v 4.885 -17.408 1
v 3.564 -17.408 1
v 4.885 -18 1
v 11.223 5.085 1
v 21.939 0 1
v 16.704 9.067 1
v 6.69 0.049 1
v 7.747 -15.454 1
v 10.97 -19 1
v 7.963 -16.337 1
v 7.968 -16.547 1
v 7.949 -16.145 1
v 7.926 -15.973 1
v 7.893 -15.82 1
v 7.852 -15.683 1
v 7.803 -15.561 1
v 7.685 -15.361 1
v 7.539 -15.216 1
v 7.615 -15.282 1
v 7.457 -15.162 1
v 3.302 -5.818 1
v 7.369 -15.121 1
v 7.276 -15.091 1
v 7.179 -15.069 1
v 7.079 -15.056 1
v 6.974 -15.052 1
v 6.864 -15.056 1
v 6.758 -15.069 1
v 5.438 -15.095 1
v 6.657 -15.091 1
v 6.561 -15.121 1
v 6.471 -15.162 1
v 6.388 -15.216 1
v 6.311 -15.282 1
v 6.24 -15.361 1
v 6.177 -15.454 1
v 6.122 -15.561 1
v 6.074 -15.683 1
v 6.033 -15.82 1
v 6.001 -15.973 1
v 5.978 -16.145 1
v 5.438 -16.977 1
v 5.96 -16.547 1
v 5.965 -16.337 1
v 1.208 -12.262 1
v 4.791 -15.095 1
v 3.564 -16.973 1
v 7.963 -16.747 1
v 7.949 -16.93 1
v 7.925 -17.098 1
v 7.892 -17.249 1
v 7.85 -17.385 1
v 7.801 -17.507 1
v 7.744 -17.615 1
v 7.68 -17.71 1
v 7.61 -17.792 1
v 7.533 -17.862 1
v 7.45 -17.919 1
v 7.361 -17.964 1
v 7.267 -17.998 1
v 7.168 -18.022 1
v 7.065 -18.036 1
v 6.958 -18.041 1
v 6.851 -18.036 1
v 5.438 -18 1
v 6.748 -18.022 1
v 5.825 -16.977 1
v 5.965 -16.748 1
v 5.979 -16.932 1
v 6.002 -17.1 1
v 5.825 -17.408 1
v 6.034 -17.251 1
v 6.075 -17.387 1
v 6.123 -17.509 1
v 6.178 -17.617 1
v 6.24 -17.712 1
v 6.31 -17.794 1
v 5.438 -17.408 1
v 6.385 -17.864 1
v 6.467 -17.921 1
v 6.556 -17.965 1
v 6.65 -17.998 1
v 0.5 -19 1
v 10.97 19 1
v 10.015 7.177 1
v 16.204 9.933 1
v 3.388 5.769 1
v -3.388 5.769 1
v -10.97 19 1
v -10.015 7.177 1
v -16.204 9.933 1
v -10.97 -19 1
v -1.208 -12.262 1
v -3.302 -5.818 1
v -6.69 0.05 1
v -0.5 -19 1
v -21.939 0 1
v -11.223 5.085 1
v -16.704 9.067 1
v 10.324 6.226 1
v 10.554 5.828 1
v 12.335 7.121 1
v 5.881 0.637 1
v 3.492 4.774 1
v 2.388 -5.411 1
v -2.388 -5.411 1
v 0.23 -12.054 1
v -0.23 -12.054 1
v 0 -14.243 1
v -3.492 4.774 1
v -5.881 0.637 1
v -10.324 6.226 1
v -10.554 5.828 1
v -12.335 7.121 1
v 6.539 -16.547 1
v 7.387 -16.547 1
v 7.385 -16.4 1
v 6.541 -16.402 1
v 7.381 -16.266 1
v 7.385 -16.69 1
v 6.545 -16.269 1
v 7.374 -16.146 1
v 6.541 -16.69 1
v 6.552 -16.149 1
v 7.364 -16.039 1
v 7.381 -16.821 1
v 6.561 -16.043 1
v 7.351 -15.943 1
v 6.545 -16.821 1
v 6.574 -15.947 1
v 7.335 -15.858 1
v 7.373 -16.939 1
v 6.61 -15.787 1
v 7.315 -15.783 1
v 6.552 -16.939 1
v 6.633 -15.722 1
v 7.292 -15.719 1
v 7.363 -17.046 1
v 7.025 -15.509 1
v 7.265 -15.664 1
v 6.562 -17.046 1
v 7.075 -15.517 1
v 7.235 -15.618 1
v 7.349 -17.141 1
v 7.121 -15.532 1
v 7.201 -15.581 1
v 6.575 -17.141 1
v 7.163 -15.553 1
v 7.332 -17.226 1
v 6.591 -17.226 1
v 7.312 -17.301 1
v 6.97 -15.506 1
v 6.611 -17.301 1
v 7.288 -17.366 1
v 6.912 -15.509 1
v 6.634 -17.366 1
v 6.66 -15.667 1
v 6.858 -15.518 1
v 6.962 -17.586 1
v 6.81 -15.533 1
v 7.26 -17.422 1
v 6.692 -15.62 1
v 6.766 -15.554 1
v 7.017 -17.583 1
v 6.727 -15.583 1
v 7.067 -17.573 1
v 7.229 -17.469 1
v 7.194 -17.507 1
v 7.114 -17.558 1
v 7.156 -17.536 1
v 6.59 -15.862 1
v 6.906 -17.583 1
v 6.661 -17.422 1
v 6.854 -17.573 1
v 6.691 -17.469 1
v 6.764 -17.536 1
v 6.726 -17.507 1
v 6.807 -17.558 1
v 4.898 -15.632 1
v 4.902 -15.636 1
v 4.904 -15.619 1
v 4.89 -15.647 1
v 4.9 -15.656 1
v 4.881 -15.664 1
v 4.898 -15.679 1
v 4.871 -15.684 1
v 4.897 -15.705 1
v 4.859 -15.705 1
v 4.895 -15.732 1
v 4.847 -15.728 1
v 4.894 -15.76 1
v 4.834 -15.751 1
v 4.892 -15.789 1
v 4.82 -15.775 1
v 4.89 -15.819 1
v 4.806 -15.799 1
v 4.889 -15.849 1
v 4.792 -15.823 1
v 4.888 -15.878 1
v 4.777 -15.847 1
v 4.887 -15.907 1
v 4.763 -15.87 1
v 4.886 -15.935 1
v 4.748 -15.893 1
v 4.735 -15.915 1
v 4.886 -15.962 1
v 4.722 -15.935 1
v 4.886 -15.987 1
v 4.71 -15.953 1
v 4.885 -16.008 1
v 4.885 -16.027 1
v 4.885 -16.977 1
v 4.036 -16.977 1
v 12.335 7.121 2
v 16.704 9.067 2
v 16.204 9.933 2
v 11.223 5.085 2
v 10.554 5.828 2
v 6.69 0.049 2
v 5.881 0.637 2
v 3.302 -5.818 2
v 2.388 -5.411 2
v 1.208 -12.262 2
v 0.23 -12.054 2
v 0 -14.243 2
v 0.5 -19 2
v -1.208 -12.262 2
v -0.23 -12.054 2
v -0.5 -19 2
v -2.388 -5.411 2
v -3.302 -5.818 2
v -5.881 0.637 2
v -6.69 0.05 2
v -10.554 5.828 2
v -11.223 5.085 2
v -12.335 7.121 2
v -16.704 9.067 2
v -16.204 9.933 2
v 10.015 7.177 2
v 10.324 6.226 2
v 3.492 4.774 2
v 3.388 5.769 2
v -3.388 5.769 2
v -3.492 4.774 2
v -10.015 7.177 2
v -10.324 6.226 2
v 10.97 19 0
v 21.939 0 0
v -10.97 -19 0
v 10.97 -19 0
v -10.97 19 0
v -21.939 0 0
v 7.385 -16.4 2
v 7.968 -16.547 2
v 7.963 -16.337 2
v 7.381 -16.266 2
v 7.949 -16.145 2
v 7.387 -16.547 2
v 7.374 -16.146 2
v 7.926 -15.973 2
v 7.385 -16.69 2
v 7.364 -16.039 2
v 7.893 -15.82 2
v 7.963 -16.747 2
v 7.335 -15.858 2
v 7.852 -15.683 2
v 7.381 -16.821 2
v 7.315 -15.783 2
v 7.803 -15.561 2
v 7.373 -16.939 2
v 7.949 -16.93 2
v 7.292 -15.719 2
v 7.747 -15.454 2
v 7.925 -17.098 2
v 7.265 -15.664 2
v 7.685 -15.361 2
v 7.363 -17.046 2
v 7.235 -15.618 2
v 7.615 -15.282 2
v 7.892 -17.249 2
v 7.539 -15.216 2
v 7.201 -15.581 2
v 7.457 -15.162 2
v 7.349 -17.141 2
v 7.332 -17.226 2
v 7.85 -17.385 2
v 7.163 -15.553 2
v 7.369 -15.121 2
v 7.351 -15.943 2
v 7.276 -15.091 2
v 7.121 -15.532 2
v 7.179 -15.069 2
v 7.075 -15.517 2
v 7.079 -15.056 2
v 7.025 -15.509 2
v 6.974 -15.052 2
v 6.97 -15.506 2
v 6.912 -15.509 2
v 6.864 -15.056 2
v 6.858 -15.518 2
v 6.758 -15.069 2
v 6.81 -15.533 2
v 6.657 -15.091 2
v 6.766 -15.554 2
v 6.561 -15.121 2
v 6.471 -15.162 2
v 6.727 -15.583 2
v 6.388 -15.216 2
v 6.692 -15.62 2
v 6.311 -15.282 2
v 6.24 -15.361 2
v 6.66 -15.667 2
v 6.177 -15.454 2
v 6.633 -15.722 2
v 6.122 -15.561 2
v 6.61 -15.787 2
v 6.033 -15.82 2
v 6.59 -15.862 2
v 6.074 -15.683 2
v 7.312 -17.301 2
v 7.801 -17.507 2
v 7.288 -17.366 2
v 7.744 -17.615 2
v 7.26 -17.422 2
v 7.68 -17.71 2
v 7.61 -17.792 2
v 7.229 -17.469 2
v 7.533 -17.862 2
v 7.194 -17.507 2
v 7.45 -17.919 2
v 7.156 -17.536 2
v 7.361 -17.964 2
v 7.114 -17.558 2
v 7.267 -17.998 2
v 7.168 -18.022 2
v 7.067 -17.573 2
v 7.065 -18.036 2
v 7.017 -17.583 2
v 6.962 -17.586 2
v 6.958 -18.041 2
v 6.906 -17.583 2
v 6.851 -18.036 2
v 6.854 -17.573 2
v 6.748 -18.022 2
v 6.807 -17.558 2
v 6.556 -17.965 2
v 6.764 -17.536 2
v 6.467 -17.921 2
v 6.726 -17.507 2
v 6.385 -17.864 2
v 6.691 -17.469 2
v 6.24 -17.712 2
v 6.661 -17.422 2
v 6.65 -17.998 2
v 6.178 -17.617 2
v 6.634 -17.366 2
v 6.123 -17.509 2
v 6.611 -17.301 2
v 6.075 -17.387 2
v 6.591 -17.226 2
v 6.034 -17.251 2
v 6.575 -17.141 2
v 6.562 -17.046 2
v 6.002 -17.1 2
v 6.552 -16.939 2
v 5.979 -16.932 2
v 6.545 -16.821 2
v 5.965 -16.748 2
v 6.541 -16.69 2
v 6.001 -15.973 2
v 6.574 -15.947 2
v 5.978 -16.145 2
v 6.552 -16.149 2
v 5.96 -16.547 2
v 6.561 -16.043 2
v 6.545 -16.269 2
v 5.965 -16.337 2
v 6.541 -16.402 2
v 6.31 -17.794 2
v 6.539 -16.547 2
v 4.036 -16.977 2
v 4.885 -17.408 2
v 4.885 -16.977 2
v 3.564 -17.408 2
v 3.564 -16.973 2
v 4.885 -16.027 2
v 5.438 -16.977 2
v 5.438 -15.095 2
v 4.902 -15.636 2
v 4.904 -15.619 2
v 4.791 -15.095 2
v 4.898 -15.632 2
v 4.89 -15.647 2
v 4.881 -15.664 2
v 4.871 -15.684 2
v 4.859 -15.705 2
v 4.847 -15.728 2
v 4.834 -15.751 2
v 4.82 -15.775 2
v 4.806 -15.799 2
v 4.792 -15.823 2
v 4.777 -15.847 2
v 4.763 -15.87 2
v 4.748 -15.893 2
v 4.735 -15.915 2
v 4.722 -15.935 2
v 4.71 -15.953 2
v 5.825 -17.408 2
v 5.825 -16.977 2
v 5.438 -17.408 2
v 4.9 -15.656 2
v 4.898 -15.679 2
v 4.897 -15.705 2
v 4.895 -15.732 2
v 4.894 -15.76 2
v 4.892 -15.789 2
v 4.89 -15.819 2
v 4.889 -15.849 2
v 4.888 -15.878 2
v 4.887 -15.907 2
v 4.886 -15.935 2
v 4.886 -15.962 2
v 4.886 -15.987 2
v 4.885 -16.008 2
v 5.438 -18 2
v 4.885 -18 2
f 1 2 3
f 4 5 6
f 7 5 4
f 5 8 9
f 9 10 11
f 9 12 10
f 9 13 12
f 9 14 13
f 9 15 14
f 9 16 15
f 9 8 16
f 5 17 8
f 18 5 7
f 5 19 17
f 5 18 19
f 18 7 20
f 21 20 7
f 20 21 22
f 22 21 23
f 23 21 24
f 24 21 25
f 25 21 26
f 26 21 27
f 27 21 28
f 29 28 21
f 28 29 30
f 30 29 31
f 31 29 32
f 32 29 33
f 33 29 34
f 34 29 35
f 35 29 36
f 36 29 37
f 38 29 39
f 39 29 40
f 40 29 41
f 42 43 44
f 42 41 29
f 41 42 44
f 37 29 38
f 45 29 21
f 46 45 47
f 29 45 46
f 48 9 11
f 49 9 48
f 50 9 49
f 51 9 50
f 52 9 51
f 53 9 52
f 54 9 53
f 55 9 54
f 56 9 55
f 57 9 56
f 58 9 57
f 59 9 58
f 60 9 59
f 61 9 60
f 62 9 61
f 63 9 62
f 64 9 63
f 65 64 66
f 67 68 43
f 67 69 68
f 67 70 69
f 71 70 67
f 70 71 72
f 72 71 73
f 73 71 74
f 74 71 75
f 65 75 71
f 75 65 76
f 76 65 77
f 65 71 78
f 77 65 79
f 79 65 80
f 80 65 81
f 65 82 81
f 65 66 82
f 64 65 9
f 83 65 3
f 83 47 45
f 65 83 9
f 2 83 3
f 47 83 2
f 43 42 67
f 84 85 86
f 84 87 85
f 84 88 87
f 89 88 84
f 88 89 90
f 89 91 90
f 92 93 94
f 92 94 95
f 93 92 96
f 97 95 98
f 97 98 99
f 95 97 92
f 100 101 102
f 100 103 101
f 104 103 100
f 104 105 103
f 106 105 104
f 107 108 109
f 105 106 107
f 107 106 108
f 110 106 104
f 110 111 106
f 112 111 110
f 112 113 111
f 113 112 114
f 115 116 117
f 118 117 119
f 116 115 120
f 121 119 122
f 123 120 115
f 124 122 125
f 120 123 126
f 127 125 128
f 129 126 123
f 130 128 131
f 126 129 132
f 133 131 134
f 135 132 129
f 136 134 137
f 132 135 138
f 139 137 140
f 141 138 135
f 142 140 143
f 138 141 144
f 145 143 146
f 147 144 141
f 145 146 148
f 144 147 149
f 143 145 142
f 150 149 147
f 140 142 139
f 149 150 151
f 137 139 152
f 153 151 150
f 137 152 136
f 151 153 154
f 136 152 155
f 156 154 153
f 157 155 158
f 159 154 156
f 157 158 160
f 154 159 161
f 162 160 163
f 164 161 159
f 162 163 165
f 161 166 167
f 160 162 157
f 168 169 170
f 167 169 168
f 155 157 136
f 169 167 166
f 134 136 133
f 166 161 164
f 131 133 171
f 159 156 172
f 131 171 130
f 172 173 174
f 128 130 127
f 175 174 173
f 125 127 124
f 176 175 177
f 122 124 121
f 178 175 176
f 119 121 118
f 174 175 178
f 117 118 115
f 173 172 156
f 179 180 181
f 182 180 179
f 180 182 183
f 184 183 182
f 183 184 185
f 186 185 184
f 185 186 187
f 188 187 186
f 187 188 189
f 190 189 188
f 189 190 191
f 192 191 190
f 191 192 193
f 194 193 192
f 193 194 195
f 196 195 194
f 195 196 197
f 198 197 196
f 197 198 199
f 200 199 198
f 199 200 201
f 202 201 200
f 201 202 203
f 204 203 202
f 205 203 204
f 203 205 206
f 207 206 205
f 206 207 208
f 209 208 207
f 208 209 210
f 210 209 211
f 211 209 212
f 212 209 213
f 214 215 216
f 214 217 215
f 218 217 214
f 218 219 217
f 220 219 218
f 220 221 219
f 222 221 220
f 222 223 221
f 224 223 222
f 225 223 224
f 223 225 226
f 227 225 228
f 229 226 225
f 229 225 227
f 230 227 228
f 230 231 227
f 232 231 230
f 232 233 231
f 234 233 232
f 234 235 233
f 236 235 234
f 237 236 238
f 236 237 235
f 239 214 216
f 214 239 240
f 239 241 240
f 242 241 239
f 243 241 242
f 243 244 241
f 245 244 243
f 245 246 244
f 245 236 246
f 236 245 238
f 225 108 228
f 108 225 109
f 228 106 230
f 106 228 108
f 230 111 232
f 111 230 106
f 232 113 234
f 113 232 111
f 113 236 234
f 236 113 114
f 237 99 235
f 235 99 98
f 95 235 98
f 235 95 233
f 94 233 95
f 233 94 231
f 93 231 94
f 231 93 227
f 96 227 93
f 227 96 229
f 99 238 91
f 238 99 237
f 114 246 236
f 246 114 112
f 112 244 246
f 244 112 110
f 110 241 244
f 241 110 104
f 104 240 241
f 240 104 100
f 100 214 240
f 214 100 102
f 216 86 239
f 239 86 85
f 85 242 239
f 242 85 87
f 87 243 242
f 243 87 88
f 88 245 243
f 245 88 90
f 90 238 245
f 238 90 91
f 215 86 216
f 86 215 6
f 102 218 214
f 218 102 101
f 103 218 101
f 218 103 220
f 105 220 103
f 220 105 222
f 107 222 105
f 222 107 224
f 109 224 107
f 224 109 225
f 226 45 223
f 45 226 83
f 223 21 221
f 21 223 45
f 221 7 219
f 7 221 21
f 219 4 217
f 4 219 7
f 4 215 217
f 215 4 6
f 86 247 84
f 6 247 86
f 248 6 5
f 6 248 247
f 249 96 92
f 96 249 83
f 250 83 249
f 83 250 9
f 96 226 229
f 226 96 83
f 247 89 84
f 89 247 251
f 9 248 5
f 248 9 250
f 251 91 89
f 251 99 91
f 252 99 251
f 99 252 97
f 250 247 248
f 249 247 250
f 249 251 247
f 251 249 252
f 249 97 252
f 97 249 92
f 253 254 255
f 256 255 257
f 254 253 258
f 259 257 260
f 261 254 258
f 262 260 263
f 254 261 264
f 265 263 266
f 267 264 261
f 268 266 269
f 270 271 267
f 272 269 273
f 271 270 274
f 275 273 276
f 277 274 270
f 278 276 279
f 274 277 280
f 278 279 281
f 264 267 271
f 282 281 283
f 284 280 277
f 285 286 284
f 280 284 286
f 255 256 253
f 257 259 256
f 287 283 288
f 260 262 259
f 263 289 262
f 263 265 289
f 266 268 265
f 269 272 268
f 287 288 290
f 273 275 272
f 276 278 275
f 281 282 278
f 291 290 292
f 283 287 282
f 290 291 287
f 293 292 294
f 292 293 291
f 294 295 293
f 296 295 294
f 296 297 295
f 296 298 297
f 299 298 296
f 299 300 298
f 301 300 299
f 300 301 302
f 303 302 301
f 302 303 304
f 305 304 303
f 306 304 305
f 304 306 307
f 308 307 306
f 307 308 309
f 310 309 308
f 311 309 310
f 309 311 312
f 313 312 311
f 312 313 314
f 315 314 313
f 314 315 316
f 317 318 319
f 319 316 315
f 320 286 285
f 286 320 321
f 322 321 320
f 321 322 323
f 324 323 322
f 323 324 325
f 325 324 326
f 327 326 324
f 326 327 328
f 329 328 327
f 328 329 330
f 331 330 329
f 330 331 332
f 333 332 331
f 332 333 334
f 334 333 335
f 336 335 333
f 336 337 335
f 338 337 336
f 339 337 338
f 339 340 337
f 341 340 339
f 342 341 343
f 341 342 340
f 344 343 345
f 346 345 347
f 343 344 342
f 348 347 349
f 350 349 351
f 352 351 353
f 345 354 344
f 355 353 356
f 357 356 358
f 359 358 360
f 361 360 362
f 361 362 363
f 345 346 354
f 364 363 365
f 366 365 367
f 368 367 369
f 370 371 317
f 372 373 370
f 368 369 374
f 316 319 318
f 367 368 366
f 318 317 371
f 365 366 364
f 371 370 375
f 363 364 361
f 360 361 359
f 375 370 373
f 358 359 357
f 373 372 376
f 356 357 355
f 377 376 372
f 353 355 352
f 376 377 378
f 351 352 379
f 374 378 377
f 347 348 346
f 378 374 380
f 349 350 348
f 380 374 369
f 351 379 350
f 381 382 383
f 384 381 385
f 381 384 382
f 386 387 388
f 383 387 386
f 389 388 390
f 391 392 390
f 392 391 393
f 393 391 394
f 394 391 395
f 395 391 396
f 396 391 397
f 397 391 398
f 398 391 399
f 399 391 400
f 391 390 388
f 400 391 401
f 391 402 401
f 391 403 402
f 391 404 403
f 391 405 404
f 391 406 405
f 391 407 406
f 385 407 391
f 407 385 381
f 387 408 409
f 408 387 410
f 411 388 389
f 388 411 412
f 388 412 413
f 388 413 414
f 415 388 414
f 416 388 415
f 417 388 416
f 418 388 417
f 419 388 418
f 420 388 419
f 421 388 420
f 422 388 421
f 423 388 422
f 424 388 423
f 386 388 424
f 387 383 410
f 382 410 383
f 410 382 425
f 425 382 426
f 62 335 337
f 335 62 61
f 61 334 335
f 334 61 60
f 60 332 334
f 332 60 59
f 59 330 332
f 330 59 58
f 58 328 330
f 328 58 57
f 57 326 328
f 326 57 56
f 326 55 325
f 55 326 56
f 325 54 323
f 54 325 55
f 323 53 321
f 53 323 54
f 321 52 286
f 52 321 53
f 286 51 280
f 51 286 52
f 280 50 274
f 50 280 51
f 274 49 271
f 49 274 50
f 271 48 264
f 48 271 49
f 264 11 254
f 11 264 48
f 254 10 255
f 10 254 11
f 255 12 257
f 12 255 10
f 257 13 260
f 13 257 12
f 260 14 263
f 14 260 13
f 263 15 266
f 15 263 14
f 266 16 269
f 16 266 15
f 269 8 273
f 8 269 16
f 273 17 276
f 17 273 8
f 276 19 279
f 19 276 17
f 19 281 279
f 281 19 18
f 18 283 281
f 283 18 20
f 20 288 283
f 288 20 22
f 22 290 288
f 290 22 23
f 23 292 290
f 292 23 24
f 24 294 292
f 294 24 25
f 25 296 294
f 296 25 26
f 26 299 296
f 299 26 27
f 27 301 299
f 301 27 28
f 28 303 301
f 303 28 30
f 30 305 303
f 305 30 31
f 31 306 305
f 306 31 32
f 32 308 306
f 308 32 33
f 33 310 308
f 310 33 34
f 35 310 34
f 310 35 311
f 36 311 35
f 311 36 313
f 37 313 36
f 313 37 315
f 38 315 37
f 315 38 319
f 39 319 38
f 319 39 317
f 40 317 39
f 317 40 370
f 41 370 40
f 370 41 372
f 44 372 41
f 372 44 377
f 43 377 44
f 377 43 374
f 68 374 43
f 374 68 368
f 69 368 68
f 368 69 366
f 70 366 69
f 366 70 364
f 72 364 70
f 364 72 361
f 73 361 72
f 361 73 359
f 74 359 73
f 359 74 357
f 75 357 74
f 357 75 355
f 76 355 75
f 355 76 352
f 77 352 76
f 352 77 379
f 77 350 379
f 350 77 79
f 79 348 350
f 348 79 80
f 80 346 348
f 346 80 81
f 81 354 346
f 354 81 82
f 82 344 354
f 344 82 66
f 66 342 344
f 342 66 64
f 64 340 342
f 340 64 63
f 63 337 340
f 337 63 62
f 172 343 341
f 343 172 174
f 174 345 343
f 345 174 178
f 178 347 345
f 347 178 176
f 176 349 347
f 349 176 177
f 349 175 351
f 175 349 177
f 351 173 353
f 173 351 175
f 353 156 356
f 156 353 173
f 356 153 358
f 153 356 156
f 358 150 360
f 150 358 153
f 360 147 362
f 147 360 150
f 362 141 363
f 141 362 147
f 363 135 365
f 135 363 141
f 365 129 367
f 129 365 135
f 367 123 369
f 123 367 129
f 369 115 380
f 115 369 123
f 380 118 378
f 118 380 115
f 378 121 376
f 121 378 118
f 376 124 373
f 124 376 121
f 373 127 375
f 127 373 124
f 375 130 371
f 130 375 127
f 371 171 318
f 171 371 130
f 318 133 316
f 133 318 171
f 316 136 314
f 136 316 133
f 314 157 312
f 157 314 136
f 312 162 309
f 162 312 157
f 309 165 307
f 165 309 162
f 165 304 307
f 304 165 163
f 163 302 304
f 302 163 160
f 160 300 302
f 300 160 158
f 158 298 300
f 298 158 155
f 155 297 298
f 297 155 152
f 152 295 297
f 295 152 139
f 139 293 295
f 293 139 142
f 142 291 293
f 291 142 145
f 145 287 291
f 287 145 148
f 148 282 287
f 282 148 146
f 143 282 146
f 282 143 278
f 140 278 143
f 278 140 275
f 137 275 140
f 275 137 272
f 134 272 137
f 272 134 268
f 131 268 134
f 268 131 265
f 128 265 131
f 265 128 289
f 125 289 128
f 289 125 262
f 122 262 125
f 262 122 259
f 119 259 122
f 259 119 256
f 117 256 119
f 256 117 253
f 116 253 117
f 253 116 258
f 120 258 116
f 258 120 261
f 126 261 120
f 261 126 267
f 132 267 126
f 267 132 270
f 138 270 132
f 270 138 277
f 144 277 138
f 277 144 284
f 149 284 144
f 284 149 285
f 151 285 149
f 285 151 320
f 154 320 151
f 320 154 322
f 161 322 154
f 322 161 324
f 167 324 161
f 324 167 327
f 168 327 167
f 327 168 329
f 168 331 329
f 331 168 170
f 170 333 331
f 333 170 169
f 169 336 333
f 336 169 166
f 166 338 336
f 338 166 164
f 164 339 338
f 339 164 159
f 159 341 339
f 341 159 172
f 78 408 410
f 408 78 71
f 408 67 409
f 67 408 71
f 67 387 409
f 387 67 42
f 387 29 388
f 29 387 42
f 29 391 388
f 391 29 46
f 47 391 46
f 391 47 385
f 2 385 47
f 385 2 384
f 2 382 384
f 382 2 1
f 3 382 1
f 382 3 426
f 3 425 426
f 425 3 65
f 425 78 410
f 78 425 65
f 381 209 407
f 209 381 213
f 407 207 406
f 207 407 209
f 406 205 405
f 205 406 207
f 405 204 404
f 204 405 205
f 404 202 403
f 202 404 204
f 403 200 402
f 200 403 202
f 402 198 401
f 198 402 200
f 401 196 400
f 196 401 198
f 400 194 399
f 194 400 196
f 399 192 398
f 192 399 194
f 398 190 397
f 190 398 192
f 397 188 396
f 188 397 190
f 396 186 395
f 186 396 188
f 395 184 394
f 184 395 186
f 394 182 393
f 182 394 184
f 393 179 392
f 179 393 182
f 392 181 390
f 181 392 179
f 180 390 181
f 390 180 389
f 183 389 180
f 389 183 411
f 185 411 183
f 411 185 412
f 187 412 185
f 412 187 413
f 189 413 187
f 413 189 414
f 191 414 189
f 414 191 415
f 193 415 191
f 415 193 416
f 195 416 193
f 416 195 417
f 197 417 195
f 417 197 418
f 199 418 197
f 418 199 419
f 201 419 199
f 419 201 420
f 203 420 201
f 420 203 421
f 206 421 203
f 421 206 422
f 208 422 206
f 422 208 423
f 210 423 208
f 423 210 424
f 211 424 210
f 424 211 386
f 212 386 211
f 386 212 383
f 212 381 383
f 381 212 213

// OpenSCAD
include <../Scripts/18xx tiles basic functions.scad>
hex("Brown");
put_tilenr("40");
light_curve(r=4);
light_curve(r=2);
light_curve(r=0);
